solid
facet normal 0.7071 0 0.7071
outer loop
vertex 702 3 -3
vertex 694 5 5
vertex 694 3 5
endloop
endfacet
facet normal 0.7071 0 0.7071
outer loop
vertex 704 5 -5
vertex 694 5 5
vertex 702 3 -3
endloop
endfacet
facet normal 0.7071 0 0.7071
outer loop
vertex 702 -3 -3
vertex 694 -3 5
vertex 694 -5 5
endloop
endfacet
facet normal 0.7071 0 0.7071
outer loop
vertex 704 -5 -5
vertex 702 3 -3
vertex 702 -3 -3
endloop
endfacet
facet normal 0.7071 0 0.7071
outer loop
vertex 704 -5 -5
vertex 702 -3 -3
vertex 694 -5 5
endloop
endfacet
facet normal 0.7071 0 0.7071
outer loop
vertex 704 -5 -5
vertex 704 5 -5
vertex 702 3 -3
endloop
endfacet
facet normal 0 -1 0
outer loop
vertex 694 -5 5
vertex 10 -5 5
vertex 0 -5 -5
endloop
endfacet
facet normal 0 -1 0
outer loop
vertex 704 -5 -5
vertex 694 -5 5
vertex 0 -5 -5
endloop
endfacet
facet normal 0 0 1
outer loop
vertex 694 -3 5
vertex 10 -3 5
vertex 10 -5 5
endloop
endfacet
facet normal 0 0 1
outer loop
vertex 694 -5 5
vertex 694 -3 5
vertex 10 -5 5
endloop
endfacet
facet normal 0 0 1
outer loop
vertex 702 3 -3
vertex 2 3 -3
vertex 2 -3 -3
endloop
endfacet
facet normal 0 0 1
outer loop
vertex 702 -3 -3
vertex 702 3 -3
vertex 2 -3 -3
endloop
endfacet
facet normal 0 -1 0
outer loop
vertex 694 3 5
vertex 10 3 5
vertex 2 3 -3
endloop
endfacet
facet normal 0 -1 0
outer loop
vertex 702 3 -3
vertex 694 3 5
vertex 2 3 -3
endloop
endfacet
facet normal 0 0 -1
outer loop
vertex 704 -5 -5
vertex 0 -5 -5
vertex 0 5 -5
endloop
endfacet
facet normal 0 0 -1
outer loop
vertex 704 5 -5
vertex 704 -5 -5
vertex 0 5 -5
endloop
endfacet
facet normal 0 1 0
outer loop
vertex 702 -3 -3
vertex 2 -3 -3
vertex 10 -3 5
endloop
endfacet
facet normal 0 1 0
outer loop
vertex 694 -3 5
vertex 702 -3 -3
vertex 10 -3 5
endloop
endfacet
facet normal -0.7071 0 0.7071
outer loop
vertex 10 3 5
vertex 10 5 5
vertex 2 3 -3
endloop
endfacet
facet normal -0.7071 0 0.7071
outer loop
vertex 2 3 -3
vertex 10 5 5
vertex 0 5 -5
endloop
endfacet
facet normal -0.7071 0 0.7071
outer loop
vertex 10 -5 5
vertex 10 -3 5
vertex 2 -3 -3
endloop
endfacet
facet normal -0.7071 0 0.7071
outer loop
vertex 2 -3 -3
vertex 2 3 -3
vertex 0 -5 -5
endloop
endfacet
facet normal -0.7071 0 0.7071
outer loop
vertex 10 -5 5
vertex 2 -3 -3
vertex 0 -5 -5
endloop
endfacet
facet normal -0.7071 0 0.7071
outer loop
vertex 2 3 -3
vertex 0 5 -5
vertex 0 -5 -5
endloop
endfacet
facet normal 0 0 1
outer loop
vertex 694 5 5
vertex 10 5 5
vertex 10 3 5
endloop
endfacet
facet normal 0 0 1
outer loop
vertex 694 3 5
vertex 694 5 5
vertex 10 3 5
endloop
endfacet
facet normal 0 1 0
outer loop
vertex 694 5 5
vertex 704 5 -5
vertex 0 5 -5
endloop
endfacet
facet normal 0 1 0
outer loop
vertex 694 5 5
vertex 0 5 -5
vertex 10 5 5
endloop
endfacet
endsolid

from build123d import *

# Parameters (mm, degrees)
F1_DEPTH   = 704
F2_C1_SIZE = 9.9999
F2_C2_SIZE = 9.9999


# Not quite as in the source:
# - a fillet or chamfer is up to 0.001 mm smaller than in the source, because OpenCascade refuses the exact size


with BuildPart() as f1:
    # F0 (on Right) → F1 (new body)
    with BuildSketch(Plane.YZ):
        Polygon((-3, 5), (-5, 5), (-5, -5), (5, -5), (5, 5), (3, 5), (3, -3), (-3, -3), align=None)
    extrude(amount=F1_DEPTH)

    # F2: chamfer of 10 on 3 edges, made by hand

    # F2_c1 (size 10 in the source; OpenCascade refuses exactly that, so slightly less here)
    f2_c1_edges = [f1.edges().sort_by_distance(p)[0] for p in [
        (0, -4, 5),
    ]]
    chamfer(f2_c1_edges, length=F2_C1_SIZE)

    # F2_c2 (size 10 in the source; OpenCascade refuses exactly that, so slightly less here)
    f2_c2_edges = [f1.edges().sort_by_distance(p)[0] for p in [
        (704, -4, 5),
    ]]
    chamfer(f2_c2_edges, length=F2_C2_SIZE)


solid = f1.part
